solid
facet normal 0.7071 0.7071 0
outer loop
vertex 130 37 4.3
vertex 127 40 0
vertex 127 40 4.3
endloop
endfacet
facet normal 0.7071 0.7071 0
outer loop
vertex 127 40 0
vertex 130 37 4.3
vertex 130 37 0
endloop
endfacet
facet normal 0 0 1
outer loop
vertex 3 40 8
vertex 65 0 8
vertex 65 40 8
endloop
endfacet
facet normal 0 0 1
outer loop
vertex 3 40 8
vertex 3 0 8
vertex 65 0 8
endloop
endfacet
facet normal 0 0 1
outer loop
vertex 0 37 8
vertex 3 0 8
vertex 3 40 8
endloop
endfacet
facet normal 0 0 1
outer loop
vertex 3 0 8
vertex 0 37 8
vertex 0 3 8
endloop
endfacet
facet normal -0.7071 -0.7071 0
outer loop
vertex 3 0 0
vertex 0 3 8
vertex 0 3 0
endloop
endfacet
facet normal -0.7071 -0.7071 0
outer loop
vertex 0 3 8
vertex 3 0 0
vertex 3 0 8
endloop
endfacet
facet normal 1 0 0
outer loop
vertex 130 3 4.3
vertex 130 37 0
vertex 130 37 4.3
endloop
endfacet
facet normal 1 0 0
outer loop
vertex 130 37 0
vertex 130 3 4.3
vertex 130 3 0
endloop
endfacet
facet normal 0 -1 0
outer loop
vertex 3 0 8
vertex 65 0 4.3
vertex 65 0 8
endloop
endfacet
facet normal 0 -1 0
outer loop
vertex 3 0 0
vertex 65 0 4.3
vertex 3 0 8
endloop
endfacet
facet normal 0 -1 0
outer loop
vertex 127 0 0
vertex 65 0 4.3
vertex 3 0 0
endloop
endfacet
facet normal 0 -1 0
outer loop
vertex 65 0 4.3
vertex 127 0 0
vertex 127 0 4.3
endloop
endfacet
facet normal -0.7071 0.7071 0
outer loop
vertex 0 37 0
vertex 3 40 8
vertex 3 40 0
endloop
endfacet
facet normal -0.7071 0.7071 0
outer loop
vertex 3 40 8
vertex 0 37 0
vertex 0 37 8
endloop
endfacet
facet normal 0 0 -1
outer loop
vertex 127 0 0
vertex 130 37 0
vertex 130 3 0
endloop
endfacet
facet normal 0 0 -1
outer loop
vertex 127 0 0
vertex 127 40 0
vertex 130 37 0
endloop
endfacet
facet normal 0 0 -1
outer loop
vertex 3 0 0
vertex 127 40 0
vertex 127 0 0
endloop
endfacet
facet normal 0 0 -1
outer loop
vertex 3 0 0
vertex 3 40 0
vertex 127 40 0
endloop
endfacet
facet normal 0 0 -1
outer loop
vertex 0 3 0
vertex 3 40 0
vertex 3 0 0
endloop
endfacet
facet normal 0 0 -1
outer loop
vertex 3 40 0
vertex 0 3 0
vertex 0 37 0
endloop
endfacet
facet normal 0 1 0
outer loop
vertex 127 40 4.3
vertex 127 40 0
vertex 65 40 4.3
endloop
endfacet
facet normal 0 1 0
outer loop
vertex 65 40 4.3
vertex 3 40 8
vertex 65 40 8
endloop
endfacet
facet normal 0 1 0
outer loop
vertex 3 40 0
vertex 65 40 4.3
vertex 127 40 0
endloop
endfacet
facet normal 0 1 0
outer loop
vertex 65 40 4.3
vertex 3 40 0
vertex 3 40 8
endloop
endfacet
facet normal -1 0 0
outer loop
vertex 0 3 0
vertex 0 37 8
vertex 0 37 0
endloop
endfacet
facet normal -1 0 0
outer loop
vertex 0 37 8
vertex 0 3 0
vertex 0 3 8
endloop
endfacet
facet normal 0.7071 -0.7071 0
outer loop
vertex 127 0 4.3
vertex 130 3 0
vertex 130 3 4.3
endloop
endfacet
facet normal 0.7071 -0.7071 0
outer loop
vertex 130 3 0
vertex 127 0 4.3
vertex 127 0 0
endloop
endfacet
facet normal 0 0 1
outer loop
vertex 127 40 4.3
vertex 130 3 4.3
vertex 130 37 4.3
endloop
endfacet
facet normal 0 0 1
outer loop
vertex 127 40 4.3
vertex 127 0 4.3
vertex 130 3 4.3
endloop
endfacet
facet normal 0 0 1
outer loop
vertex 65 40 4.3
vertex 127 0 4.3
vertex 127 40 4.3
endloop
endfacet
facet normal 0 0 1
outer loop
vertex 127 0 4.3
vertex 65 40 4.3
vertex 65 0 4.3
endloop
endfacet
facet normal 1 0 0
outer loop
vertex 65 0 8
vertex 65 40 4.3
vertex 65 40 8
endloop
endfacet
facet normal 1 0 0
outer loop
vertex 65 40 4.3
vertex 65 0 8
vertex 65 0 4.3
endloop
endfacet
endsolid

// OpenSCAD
$fn = 32;

// ----------------------------------------------------------------------
// Stepped bar: endstep, 130 x 40 x 8/4.3 mm
// ----------------------------------------------------------------------

// --- parameters (mm) ---
bar_l = 130;              // bar length, X
bar_w = 40;               // bar width, Y
plate_t = 8;              // thickness of the thick zone, Z
thin_t = 4.3;             // thickness of the thin zone
corner_c = 3;             // corner chamfer of the bar
step_cut = 3.7;           // material removed from the thin zone
step_x = 65;              // step position from the left end
depth_1 = 3.7;            // depth of cut 1 from the top face

profile = [[3, 0], [127, 0], [130, 3], [130, 37], [127, 40], [3, 40], [0, 37], [0, 3]];  // primary outline, 8 points, counter clockwise
void_1 = [[65, -1], [131, -1], [131, 41], [65, 41]];  // thin zone beyond the step, 4 points

// --- the one profile operation ---
difference() {
  linear_extrude(height = plate_t) polygon(points = profile);
  translate([0, 0, plate_t - depth_1])
    linear_extrude(height = depth_1 + 1) polygon(points = void_1);
}
